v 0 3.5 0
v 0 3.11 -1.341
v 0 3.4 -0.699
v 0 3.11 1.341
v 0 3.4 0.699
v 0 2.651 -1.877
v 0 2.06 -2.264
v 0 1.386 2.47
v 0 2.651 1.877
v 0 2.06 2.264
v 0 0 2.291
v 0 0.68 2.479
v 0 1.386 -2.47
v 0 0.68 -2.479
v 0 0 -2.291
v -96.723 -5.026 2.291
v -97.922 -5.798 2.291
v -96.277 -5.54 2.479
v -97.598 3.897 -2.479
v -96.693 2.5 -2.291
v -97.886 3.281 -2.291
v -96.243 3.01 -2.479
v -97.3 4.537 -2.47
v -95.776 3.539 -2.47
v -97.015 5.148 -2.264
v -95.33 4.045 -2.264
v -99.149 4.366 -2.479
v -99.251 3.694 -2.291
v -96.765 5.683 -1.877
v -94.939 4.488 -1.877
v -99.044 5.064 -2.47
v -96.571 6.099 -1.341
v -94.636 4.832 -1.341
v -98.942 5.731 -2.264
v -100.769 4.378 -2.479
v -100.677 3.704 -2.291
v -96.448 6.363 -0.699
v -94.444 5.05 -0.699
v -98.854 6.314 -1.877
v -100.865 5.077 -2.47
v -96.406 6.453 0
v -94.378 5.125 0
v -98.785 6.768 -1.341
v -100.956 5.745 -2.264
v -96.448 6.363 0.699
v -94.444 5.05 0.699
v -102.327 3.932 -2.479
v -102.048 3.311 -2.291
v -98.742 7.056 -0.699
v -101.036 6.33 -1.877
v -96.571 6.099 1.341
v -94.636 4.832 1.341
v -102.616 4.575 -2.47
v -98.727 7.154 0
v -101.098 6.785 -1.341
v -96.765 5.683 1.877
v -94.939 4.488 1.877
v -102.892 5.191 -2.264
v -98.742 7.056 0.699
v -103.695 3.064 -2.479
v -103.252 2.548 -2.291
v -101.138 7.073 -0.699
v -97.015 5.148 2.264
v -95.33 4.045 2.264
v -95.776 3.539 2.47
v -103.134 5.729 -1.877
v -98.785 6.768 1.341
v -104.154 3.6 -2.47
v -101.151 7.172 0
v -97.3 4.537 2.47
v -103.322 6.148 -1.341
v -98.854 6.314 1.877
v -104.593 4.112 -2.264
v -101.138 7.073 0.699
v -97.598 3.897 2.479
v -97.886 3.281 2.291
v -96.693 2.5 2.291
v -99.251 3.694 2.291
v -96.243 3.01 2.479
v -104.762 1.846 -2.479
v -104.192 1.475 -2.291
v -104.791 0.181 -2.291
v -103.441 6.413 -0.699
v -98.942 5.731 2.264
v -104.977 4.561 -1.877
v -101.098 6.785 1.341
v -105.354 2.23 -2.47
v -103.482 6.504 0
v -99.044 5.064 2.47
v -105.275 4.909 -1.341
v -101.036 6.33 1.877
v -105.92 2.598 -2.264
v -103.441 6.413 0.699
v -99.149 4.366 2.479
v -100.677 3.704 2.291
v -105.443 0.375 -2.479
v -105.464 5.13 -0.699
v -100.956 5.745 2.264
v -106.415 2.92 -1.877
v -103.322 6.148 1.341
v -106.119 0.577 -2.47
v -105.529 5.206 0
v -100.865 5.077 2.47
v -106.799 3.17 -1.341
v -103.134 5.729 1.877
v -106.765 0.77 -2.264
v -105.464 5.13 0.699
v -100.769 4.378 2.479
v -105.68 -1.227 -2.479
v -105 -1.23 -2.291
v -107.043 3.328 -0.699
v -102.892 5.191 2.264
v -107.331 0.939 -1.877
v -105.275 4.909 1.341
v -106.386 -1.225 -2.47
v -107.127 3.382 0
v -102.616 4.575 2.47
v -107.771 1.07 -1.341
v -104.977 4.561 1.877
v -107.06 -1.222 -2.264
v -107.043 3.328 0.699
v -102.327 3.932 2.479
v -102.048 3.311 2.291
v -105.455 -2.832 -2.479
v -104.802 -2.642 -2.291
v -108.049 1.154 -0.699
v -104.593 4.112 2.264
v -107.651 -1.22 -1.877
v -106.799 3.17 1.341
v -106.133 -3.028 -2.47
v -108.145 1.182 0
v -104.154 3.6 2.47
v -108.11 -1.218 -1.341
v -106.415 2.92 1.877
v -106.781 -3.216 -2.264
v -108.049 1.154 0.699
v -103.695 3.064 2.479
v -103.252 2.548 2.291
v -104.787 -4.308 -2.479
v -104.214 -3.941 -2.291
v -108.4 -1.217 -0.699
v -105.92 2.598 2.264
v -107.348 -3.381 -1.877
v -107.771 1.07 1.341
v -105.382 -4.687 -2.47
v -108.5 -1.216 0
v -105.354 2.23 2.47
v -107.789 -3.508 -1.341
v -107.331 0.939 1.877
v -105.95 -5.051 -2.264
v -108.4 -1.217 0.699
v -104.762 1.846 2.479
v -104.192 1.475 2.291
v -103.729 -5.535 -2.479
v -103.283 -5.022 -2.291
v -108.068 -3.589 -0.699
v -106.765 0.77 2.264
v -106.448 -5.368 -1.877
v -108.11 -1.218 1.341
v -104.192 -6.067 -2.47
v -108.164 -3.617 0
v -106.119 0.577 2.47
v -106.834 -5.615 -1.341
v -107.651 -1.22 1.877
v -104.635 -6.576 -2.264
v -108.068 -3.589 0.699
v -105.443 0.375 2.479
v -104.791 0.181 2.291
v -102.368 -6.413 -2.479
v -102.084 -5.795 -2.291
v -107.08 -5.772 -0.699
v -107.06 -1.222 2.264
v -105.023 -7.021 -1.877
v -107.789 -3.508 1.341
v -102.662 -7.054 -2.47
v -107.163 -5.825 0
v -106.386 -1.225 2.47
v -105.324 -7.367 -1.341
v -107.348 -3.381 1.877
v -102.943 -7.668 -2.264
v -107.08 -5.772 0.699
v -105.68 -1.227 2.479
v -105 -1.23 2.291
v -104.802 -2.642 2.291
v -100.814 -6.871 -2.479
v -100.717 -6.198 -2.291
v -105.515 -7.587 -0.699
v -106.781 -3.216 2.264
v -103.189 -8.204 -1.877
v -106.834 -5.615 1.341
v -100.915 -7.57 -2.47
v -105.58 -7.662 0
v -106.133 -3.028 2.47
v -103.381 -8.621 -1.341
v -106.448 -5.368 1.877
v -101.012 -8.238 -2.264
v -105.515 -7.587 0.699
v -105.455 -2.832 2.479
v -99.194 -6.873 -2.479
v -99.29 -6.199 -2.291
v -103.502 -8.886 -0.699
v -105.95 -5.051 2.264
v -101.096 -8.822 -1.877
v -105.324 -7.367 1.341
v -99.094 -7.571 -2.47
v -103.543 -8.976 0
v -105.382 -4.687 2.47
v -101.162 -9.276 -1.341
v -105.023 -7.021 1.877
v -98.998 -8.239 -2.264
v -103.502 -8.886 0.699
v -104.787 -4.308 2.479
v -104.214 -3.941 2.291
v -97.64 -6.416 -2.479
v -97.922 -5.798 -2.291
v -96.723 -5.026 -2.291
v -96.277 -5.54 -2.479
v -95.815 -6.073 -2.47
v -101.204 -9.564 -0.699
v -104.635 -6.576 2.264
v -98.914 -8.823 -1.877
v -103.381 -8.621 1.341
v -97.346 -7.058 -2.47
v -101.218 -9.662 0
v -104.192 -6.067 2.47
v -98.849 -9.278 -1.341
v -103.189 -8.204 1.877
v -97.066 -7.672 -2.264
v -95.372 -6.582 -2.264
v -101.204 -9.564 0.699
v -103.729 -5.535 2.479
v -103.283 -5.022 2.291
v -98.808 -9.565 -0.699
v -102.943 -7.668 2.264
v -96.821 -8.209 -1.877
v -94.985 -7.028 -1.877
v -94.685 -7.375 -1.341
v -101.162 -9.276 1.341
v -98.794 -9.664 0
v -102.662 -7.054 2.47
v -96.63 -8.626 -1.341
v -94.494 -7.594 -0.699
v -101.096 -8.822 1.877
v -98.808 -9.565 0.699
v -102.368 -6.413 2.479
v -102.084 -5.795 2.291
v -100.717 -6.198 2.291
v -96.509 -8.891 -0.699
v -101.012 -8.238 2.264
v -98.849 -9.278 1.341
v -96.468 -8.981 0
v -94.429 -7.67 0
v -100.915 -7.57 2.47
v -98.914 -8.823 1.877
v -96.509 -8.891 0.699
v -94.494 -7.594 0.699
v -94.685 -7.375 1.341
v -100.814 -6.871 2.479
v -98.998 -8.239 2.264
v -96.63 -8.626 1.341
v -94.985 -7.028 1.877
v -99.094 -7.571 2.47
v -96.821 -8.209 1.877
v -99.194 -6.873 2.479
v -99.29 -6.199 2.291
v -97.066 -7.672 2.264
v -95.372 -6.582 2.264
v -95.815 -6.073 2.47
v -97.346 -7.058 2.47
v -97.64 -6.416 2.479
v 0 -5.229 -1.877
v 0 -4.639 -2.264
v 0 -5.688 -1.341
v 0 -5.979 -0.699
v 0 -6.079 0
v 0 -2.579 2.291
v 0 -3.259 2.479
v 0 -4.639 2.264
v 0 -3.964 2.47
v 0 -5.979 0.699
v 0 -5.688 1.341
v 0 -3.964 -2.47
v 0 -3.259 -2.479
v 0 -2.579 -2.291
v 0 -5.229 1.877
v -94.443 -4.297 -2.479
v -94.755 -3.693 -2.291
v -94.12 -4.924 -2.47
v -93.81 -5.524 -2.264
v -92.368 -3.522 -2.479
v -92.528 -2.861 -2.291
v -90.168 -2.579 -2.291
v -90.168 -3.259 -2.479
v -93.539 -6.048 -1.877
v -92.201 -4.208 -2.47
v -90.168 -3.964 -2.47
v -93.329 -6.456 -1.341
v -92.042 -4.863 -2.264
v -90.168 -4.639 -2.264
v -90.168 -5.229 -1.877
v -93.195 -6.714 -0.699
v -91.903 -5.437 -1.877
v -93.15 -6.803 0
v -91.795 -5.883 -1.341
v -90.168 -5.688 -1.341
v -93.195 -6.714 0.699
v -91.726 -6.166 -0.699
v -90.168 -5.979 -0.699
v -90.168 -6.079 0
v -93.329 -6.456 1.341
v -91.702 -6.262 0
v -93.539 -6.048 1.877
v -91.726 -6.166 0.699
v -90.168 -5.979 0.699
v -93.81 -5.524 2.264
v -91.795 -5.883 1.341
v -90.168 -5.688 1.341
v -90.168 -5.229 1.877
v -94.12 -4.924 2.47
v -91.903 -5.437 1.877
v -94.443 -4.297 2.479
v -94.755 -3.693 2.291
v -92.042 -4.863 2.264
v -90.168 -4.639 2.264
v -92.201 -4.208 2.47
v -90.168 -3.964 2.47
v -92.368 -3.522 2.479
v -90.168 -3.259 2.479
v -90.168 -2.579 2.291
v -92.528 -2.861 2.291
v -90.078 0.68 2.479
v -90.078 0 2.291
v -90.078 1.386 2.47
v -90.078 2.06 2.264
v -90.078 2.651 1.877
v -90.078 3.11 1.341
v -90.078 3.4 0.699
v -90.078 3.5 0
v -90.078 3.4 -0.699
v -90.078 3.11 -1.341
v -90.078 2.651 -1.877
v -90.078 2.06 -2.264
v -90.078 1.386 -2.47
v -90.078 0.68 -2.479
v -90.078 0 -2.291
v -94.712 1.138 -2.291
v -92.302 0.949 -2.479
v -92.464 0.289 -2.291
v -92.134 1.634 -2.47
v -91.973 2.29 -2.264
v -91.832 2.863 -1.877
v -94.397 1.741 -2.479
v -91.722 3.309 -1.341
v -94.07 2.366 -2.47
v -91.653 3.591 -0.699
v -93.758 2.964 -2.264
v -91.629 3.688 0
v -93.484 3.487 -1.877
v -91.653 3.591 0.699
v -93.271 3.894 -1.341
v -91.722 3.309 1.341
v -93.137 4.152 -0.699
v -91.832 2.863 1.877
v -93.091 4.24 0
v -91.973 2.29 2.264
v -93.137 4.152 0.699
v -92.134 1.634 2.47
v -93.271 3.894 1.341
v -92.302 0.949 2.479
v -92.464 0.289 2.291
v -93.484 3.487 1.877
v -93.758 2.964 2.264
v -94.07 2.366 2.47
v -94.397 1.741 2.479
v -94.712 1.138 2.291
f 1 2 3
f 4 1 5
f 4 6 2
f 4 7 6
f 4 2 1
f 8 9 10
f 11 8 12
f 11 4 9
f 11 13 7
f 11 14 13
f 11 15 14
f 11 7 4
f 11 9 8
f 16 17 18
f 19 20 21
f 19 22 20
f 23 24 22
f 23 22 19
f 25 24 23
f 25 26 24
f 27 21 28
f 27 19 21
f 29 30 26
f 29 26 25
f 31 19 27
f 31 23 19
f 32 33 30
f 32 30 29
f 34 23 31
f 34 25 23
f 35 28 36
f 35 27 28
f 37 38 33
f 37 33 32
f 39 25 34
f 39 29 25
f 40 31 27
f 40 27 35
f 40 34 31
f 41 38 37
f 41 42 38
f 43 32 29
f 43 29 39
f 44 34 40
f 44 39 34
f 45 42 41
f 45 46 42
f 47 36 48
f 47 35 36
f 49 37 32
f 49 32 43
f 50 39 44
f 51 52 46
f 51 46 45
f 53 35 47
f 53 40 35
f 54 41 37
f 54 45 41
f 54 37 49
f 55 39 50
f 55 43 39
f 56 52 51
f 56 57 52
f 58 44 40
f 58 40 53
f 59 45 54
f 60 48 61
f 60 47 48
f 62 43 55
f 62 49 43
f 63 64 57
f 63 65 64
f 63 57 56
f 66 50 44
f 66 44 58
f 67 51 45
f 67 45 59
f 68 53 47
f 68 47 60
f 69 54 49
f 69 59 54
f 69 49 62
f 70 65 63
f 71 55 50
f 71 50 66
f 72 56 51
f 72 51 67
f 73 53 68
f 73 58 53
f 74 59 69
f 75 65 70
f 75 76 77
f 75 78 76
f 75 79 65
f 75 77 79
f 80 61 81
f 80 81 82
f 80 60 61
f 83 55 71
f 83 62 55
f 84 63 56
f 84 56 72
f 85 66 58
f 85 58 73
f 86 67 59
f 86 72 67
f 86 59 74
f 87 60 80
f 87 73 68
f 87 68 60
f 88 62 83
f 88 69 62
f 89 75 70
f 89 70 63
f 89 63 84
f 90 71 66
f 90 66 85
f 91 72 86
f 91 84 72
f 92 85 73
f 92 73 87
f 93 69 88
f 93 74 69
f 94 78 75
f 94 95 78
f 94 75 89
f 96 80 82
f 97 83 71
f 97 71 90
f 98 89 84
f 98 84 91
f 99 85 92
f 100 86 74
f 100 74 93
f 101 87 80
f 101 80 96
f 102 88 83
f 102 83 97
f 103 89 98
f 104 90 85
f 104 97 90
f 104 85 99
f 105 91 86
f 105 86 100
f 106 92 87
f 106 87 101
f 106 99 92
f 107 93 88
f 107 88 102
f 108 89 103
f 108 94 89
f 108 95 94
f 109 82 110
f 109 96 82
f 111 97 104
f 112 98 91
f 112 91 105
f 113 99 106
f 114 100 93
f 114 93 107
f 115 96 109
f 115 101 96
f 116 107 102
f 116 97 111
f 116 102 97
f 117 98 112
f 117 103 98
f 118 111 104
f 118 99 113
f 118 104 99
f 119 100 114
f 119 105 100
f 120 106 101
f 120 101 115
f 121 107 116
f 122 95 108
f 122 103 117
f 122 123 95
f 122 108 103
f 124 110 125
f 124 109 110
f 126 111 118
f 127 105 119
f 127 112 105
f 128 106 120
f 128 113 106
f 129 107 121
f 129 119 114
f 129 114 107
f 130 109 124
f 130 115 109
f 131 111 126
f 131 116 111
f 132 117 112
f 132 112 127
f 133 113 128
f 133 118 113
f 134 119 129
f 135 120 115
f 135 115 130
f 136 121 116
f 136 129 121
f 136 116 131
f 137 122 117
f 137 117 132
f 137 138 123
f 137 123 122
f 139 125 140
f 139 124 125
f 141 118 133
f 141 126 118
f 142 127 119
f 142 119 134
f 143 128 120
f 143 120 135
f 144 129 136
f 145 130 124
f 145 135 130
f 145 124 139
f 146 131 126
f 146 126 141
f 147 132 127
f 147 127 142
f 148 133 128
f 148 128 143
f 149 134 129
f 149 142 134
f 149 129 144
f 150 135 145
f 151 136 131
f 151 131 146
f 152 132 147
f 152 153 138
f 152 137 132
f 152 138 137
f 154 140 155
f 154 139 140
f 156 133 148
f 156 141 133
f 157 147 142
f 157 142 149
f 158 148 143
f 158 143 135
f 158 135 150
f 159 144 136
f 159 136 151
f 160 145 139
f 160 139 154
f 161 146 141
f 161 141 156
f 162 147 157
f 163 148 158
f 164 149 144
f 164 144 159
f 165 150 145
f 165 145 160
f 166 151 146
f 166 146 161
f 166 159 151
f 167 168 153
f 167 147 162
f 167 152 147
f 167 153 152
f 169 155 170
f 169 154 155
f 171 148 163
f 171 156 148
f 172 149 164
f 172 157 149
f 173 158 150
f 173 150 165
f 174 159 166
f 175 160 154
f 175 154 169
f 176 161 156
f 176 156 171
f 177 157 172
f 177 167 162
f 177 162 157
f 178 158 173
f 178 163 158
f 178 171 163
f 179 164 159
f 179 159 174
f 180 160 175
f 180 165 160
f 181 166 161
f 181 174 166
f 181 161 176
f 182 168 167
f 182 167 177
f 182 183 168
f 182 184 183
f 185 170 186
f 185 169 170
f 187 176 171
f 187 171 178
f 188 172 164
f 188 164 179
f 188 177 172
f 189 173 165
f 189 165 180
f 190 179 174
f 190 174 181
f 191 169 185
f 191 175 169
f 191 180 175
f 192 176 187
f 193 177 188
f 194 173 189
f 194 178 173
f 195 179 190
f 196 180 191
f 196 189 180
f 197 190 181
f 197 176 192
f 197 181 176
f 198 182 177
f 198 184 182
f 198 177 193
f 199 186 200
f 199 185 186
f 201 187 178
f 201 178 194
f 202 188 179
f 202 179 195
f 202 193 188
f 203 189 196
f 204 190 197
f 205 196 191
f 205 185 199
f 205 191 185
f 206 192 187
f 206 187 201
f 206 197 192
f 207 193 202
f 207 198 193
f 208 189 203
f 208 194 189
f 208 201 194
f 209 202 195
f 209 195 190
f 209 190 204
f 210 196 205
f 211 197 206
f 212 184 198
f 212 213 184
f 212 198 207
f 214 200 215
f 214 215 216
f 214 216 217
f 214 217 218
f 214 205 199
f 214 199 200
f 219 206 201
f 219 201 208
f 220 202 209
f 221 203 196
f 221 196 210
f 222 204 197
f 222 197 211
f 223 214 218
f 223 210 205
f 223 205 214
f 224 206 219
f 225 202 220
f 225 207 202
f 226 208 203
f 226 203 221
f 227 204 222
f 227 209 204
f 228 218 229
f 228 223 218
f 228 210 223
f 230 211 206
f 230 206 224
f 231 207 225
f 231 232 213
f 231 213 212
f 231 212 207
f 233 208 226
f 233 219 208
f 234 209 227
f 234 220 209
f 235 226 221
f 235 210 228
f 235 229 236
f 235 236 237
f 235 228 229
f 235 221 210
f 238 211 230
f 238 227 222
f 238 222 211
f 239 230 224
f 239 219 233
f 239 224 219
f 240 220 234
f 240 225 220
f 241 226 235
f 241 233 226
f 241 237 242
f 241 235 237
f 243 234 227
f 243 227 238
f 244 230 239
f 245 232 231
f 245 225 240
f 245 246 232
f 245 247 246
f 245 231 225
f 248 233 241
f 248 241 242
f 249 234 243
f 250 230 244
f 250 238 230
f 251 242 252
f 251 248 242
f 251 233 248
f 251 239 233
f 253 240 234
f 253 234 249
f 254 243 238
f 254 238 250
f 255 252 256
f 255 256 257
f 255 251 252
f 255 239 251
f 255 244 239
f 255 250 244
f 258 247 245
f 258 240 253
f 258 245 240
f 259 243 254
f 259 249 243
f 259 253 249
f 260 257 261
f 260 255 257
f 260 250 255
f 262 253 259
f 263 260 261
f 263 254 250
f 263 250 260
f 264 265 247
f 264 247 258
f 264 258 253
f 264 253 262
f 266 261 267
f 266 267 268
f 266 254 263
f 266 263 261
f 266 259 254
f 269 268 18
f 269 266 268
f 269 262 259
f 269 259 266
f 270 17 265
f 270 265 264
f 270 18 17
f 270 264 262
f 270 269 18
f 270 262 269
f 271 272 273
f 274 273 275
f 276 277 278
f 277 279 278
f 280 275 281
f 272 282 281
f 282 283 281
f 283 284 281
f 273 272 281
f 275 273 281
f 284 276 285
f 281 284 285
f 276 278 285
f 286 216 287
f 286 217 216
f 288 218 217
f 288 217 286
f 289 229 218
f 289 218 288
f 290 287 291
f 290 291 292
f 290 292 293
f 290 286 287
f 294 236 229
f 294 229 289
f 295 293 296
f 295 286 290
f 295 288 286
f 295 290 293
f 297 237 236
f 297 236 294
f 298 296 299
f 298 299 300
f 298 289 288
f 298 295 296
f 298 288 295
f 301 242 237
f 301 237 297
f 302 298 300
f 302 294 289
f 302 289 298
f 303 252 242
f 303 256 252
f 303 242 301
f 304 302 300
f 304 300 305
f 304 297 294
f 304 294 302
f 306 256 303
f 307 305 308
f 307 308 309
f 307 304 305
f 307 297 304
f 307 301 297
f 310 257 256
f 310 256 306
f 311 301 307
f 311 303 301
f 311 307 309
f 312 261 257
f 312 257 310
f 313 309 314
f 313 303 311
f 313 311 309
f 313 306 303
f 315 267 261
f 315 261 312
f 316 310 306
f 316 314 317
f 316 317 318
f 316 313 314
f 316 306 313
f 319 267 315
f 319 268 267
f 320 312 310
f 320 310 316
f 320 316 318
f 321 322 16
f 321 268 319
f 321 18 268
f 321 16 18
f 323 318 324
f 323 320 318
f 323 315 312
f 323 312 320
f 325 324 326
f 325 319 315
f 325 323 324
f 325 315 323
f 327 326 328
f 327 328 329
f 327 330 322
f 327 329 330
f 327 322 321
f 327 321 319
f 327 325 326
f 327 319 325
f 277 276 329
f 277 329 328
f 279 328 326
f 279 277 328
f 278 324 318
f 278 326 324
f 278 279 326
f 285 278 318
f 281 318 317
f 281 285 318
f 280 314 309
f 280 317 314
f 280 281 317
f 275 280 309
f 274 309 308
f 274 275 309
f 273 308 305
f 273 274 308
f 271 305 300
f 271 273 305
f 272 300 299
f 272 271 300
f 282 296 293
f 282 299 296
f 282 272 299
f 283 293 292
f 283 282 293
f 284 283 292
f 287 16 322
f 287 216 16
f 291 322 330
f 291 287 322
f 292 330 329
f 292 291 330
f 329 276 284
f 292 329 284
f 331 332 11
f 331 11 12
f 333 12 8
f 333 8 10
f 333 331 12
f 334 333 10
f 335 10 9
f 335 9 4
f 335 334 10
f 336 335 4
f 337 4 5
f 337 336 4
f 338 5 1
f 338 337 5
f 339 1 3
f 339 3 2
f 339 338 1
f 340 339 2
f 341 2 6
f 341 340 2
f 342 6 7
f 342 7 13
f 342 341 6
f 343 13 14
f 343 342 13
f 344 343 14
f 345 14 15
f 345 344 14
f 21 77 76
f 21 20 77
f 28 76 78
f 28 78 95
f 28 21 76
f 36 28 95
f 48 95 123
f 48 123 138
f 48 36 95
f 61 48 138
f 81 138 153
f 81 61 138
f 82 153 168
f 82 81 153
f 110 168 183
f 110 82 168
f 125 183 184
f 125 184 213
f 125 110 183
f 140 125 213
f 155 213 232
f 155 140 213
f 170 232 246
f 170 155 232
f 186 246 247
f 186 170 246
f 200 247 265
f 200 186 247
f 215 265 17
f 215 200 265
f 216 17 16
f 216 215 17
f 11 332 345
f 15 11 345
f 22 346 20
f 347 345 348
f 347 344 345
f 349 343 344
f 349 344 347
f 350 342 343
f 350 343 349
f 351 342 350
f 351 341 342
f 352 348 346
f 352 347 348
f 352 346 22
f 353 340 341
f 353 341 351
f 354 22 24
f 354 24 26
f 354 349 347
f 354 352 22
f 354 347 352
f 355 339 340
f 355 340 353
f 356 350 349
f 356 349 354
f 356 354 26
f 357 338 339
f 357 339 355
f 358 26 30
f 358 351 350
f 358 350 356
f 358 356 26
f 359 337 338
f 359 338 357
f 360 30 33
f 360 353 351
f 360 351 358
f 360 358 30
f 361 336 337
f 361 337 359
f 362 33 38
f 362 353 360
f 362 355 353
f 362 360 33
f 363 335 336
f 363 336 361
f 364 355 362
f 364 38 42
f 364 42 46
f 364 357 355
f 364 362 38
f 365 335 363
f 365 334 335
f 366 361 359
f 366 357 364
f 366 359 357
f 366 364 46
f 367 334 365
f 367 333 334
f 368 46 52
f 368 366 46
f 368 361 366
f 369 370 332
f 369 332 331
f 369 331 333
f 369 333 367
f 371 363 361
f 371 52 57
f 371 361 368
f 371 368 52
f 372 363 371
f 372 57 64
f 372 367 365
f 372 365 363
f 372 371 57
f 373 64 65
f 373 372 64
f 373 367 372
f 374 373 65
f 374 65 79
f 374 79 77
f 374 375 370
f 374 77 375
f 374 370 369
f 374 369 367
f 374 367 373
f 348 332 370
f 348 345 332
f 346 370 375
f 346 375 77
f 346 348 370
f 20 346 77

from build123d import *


with BuildPart() as part:
    # Sweep1: sweep along a path in Sketch1
    with BuildLine(Plane.XY) as sweep1_path:
        Line((0, 0), (-90.078432584, 0))
        ThreePointArc((-90.078432584, 0), (-93.613966489, 0.645856533), (-96.692810861, 2.5))
        ThreePointArc((-96.692810861, 2.5), (-104.999960358, -1.230089771), (-96.72278085, -5.026219624))
        ThreePointArc((-96.72278085, -5.026219624), (-93.666599798, -3.210510909), (-90.168342551, -2.578658871))
        Line((-90.168342551, -2.578658871), (0, -2.578658871))
    # Sketch2 → Sweep1 (sweep)
    with BuildSketch(Plane(origin=(0, 0, 0), x_dir=(0, 0, -1), z_dir=(1, 0, 0))):
        with BuildLine():
            Line((2.291287847, 0), (-2.291287847, 0))
            ThreePointArc((-2.291287847, 0), (0, 3.5), (2.291287847, 0))
        make_face()
    sweep(path=sweep1_path.line)


solid = part.part
